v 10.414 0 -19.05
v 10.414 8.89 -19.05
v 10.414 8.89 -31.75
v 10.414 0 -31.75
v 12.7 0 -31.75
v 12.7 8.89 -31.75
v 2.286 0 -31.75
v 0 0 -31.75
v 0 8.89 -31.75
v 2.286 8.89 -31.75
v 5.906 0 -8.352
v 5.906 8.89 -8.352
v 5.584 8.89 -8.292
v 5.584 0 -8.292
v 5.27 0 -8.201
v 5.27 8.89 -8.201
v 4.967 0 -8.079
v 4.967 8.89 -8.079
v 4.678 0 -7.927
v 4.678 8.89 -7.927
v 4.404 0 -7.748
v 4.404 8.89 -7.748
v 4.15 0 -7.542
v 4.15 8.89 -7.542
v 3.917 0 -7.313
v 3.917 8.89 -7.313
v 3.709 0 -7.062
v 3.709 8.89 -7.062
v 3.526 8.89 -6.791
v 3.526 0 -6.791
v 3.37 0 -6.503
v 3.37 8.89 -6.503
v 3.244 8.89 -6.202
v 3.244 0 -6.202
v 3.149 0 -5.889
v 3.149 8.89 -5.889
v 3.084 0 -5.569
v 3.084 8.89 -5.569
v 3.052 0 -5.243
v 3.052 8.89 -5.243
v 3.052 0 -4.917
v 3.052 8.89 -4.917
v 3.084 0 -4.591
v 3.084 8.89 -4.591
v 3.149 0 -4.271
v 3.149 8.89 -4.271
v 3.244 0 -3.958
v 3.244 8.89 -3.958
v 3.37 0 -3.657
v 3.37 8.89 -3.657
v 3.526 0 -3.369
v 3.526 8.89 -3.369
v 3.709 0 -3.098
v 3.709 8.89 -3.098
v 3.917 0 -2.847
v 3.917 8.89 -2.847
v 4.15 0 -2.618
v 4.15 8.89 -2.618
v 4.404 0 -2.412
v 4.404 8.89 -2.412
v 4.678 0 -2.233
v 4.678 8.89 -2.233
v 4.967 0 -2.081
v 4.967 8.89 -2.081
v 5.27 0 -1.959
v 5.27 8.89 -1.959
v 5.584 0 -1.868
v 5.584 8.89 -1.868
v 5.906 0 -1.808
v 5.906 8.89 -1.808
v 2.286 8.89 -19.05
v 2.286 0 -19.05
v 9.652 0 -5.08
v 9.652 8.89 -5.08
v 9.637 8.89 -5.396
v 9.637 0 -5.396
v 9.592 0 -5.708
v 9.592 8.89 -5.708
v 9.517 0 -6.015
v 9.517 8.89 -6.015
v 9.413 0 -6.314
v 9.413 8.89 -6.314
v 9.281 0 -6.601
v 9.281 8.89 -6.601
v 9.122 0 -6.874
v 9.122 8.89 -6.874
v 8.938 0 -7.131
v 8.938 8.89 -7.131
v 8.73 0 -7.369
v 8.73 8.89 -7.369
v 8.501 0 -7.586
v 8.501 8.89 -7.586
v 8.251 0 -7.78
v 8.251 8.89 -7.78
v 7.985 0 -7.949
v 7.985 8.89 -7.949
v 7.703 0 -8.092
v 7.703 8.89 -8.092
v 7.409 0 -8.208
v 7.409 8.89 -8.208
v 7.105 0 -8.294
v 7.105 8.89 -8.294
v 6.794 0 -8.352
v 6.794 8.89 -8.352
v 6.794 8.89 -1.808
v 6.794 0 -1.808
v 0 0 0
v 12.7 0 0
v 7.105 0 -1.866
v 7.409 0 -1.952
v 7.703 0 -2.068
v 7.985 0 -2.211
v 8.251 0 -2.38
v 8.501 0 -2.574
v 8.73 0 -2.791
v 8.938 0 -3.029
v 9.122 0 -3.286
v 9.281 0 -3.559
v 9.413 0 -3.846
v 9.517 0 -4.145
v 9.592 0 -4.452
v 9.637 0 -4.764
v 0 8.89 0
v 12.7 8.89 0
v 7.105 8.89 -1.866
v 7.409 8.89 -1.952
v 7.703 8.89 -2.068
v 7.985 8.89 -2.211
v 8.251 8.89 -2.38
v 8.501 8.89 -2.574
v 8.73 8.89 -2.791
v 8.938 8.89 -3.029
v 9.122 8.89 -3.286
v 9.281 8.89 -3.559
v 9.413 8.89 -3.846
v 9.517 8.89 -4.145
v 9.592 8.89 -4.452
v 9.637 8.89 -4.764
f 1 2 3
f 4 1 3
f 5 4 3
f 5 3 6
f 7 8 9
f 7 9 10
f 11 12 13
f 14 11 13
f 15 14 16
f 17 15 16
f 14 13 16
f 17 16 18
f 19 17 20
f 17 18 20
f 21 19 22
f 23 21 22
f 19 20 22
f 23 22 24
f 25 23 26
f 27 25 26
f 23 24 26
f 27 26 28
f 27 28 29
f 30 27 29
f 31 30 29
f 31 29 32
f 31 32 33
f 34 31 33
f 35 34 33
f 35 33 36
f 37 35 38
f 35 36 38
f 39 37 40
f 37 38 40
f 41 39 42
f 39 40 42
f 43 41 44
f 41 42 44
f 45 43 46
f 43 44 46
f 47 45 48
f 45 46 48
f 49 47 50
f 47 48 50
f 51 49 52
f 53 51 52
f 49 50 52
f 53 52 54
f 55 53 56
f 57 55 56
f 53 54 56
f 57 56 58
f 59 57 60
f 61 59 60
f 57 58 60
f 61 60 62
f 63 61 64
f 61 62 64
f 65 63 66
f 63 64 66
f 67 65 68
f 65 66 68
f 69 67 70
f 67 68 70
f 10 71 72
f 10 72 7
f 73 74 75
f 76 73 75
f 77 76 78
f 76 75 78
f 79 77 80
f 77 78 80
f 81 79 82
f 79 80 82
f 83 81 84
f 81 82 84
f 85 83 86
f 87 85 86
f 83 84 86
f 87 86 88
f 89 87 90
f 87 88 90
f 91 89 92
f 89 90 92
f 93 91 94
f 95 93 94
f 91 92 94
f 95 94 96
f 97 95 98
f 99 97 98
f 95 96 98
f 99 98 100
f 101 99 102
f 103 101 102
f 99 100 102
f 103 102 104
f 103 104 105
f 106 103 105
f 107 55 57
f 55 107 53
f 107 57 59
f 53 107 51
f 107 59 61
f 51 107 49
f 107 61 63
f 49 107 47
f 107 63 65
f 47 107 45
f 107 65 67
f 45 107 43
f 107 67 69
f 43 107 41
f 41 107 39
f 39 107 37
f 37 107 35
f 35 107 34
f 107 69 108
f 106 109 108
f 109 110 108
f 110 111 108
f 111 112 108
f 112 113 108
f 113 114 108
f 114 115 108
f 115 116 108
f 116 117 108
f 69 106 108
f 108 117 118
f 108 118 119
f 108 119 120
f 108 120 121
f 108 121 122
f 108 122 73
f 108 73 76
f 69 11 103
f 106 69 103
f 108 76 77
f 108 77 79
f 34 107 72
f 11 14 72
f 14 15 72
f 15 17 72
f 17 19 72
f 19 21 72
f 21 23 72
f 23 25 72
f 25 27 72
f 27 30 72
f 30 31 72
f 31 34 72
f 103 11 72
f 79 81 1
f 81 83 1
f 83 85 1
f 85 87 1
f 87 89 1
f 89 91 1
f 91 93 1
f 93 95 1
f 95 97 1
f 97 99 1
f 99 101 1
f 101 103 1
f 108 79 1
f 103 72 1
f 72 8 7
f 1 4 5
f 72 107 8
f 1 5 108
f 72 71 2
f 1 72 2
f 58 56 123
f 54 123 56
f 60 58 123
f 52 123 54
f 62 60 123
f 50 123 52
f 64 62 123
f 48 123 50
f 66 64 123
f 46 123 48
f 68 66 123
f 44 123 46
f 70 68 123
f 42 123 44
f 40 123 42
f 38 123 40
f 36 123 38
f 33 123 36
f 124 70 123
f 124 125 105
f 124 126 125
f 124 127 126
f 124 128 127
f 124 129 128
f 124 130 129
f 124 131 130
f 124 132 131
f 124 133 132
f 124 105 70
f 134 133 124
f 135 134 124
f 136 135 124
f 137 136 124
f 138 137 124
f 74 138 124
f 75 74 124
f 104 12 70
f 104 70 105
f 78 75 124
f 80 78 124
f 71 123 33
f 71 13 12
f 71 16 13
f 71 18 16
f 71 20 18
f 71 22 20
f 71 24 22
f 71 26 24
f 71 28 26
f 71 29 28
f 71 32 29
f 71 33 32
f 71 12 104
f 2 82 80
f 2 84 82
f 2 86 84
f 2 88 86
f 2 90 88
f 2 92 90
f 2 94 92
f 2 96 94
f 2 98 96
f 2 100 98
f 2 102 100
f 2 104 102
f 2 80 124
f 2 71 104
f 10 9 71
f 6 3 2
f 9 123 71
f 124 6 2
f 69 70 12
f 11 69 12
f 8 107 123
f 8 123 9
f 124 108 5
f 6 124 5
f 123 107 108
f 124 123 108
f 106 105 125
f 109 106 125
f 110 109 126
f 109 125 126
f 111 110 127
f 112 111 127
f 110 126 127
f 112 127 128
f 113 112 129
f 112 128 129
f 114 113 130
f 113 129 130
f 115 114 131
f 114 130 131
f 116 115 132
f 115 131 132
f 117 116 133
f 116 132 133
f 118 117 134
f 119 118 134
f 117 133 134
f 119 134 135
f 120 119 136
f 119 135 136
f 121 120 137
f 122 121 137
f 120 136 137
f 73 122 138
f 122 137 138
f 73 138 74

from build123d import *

# Parameters (mm, degrees)
SKETCH1_W           = 12.7
SKETCH1_H           = 31.75
BOSS_EXTRUDE1_DEPTH = 8.89
SKETCH2_W           = 8.128
SKETCH2_H           = 12.7
CUT_EXTRUDE1_DEPTH  = 8.89


with BuildPart() as part:
    # Sketch1 → Boss-Extrude1 (new body)
    with BuildSketch(Plane(origin=(0, 0, 0), x_dir=(1, 0, 0), z_dir=(0, 1, 0))):
        with Locations((6.35, 15.875)):
            Rectangle(SKETCH1_W, SKETCH1_H)
    extrude(amount=BOSS_EXTRUDE1_DEPTH)

    # Sketch2 → Cut-Extrude1 (cut)
    with BuildSketch(Plane(origin=(0, 8.89, 0), x_dir=(1, 0, 0), z_dir=(0, 1, 0))):
        with Locations((6.35, 25.4)):
            Rectangle(SKETCH2_W, SKETCH2_H)
        with BuildLine():
            ThreePointArc((9.652, 5.08), (8.837060816, 7.252034185), (6.7945, 8.351944949))
            Line((6.7945, 8.351944949), (6.7945, 1.808055051))
            ThreePointArc((6.7945, 1.808055051), (8.837060816, 2.907965815), (9.652, 5.08))
        make_face()
        with BuildLine():
            Line((5.9055, 1.808055051), (5.9055, 8.351944949))
            ThreePointArc((5.9055, 8.351944949), (3.048, 5.08), (5.9055, 1.808055051))
        make_face()
    extrude(amount=-CUT_EXTRUDE1_DEPTH, mode=Mode.SUBTRACT)


solid = part.part
